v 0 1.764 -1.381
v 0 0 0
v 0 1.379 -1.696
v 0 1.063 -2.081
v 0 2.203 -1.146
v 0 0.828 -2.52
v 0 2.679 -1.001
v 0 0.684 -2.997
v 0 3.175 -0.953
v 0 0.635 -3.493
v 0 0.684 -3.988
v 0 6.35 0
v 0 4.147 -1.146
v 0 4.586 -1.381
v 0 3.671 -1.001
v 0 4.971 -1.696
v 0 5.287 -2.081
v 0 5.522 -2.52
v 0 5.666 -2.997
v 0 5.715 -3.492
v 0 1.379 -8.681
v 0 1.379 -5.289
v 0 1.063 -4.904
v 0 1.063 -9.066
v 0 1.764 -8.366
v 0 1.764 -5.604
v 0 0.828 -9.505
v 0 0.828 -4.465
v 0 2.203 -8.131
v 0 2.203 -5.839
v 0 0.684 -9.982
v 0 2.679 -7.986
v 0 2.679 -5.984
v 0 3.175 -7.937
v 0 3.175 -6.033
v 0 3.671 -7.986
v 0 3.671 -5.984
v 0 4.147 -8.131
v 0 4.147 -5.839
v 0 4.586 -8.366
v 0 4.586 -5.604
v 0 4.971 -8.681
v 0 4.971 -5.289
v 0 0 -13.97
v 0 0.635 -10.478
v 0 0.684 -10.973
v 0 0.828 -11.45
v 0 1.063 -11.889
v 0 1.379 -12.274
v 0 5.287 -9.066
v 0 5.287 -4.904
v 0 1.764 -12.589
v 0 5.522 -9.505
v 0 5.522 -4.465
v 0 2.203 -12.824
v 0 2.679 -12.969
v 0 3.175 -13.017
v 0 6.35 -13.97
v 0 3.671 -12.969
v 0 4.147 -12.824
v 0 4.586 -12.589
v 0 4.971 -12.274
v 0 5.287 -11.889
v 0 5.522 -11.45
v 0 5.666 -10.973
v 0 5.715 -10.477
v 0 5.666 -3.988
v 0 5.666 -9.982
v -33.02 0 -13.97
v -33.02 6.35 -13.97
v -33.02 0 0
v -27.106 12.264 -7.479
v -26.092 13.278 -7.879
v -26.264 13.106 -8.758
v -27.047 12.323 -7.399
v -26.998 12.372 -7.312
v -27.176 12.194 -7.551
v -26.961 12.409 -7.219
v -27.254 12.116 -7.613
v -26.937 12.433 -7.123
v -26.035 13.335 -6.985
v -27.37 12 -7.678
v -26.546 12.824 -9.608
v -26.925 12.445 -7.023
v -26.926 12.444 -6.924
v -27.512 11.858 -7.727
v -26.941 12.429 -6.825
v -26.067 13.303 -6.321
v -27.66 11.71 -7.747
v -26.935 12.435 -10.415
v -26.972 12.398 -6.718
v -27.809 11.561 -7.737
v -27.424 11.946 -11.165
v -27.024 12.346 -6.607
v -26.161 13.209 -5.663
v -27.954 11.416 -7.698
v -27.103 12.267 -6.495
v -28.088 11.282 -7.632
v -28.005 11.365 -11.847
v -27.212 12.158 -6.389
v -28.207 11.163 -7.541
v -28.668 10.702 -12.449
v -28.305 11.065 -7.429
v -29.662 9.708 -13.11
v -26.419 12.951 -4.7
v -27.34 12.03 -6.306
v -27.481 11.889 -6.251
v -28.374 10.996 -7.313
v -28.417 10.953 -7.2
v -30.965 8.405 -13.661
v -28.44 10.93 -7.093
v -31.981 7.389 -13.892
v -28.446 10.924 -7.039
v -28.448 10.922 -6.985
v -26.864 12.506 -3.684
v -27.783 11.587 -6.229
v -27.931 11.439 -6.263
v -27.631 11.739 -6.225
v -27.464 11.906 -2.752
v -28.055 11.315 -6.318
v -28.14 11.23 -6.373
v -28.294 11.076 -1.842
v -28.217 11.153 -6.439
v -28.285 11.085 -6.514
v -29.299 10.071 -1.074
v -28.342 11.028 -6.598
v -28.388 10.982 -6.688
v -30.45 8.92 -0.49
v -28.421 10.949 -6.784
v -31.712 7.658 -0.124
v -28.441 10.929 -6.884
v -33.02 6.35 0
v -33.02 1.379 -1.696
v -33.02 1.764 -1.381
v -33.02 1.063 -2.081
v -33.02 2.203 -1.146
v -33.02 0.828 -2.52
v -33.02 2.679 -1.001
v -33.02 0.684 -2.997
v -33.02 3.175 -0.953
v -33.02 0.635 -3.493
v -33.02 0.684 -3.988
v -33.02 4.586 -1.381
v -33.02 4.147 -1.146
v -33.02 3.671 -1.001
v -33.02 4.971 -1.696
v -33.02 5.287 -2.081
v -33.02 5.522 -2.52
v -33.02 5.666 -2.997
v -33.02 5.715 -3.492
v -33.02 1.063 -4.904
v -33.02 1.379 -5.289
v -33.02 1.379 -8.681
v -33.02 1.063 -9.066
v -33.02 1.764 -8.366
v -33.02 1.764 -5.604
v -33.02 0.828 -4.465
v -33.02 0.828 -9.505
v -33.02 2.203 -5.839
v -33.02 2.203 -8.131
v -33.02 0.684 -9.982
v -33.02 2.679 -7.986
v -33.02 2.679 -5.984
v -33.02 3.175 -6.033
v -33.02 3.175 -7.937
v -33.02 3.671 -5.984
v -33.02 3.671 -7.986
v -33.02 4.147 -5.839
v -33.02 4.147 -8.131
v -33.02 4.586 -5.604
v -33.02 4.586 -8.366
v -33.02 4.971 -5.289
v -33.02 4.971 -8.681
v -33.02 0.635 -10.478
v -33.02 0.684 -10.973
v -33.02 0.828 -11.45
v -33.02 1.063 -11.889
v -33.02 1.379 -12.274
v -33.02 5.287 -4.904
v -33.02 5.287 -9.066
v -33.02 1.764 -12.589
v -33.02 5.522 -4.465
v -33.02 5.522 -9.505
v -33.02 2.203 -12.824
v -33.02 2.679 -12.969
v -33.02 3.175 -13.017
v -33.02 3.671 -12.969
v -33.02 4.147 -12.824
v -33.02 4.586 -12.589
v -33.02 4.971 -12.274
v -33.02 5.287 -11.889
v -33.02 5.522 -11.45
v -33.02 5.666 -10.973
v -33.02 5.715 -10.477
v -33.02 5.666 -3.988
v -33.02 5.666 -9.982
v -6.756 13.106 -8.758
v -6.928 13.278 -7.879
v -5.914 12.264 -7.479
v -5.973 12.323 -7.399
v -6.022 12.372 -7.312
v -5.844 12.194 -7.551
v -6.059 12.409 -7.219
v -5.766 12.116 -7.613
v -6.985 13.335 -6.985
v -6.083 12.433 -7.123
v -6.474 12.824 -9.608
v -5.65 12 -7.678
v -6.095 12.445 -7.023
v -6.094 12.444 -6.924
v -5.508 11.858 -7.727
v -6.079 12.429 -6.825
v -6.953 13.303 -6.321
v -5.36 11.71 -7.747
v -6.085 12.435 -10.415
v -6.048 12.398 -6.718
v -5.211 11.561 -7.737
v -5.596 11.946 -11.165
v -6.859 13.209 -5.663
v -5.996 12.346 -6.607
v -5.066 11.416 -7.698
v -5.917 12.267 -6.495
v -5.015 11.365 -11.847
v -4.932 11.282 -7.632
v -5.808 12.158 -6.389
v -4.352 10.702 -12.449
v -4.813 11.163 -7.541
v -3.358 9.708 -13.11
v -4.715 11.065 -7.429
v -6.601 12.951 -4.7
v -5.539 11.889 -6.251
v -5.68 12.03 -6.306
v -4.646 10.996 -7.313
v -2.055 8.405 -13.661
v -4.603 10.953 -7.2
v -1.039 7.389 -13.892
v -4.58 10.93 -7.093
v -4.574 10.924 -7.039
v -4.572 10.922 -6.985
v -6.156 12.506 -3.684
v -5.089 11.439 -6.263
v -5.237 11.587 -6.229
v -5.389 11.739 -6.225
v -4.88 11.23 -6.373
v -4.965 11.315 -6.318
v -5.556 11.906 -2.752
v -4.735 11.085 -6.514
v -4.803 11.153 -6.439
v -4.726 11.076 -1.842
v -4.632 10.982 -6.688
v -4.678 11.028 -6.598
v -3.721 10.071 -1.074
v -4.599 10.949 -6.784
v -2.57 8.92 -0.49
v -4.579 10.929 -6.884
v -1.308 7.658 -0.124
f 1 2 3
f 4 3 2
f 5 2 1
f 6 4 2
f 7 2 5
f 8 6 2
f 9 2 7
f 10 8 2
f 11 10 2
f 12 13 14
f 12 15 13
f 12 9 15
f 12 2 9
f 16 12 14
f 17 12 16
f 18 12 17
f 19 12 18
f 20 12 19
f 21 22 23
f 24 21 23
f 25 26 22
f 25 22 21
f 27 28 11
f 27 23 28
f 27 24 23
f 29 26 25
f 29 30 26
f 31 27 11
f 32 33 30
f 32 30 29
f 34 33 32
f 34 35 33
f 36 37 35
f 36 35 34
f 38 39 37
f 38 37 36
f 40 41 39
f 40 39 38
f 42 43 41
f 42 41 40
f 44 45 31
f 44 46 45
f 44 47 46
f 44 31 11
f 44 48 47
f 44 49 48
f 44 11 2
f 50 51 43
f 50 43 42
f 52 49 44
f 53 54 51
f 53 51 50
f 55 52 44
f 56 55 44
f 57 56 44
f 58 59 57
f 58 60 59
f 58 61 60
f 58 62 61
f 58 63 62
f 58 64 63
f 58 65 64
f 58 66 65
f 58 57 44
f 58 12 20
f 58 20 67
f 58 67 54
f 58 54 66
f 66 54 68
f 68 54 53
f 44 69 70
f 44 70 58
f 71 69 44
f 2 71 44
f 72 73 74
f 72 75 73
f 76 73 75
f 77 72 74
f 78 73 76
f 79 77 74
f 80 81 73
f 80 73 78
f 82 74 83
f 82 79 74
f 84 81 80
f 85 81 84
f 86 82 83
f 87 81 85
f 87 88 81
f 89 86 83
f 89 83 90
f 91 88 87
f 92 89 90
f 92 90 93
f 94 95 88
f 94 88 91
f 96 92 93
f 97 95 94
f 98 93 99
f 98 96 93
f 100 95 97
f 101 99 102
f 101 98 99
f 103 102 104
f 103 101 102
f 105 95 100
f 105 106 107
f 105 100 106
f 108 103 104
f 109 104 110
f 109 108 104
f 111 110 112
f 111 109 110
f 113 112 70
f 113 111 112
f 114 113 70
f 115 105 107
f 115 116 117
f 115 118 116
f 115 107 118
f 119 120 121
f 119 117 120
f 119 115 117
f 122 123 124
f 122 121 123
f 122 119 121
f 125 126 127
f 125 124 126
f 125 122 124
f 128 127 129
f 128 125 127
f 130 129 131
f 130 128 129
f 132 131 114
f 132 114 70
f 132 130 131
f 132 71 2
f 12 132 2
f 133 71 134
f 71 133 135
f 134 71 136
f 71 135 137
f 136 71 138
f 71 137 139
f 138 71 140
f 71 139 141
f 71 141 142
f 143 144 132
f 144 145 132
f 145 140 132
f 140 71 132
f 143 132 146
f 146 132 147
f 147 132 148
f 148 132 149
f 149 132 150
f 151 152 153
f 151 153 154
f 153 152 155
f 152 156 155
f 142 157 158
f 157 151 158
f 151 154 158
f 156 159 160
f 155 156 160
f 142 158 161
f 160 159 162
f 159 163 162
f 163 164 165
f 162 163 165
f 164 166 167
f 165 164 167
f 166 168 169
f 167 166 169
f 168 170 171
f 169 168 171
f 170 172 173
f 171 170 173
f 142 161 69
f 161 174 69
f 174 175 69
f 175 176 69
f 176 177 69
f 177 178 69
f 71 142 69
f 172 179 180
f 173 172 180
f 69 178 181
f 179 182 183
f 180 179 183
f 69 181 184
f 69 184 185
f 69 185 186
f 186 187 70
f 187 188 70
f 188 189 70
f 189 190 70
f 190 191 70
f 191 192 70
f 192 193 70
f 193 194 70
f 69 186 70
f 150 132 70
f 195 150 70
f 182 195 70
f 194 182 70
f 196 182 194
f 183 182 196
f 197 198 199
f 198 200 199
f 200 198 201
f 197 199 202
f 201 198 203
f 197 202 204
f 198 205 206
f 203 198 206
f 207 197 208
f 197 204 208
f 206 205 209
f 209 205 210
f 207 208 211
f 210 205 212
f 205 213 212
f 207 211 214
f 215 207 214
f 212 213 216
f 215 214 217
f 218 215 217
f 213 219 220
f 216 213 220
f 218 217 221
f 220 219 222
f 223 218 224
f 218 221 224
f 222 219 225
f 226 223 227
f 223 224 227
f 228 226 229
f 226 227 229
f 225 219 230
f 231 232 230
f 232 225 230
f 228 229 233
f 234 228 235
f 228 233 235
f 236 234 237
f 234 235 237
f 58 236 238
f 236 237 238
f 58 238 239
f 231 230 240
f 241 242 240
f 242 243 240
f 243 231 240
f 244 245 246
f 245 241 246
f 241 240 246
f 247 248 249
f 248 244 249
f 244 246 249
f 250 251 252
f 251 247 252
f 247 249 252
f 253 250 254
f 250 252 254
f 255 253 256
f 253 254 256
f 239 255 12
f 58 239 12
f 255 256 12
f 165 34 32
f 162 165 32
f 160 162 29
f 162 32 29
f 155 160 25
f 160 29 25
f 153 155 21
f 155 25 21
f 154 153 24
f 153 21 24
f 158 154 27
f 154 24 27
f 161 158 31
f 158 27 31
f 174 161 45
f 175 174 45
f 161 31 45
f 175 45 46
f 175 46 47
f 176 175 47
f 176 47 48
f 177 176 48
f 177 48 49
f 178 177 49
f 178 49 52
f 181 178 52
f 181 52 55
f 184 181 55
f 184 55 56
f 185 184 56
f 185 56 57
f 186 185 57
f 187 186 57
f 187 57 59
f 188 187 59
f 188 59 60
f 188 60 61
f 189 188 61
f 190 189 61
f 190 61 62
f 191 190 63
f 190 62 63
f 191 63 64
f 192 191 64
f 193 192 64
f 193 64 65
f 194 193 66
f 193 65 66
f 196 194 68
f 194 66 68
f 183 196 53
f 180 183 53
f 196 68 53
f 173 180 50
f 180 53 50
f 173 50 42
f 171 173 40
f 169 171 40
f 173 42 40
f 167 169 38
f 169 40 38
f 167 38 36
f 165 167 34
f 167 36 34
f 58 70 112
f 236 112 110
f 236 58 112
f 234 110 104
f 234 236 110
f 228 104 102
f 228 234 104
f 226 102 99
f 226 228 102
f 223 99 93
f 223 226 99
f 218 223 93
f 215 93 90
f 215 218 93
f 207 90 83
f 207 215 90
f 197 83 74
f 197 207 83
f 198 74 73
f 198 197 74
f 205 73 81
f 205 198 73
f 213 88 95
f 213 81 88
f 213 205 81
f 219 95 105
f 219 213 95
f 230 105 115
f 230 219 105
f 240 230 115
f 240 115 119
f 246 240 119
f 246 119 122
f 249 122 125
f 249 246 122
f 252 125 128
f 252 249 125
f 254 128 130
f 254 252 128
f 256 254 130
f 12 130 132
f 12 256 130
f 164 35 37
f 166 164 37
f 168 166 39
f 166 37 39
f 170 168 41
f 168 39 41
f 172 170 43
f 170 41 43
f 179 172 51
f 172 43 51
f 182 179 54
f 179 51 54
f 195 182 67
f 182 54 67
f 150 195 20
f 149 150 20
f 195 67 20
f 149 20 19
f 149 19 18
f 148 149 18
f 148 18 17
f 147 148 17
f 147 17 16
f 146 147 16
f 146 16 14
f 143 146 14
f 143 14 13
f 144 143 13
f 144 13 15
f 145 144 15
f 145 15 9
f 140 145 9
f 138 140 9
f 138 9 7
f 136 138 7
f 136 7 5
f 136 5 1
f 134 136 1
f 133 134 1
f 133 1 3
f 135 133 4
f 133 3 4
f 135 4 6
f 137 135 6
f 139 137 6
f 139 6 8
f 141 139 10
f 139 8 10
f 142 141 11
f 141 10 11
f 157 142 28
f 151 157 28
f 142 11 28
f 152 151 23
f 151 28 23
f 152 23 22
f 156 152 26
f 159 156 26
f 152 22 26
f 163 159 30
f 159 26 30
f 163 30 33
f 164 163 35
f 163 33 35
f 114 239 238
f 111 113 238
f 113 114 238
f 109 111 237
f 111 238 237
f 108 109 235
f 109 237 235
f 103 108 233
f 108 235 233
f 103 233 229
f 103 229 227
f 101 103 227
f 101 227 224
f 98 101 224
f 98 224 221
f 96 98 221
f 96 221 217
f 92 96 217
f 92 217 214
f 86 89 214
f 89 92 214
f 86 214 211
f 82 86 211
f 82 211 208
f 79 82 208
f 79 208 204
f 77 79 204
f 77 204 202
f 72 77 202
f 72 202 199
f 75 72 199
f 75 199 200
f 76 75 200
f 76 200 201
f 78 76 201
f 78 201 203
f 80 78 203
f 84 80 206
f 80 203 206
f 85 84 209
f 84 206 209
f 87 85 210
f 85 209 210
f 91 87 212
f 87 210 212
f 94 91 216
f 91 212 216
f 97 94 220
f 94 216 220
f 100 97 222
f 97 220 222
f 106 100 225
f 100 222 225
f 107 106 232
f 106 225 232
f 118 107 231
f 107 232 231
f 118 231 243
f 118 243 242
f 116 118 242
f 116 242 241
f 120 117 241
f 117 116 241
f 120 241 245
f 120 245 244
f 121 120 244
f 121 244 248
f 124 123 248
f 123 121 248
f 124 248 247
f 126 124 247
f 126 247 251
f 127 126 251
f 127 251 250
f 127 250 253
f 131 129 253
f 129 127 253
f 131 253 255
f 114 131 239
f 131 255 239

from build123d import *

# Parameters (mm, degrees)
SKETCH1_W              = 33.02
SKETCH1_H              = 13.97
DEPTH_A_DEPTH          = 6.35
ROUND_EXTRUDE_DEPTH    = 33.02
ANGLE_CUT_DEPTH        = 39.253150524
STRING_HOLE_R          = 0.762
STRING_HOLE_CUT_DEPTH  = 39.253150524
ELASTIC_HOLES_R        = 2.54
ELASTIC_HOLE_CUT_DEPTH = 39.253150524


with BuildPart() as part:
    # Sketch1 → depth a (new body)
    with BuildSketch(Plane(origin=(0, 0, 0), x_dir=(1, 0, 0), z_dir=(0, 1, 0))):
        with Locations((-16.51, 6.985)):
            Rectangle(SKETCH1_W, SKETCH1_H)
    extrude(amount=DEPTH_A_DEPTH)

    # Sketch4 → round extrude (add)
    with BuildSketch(Plane(origin=(0, 0, 0), x_dir=(0, 0, -1), z_dir=(1, 0, 0))):
        with BuildLine():
            Line((0, 6.35), (13.97, 6.35))
            ThreePointArc((13.97, 6.35), (6.985, 13.335), (0, 6.35))
        make_face()
    extrude(amount=-ROUND_EXTRUDE_DEPTH)

    # Sketch5 → angle cut (cut, through all)
    with BuildSketch(Plane.XY):
        Polygon((0, 6.35), (0, 13.335), (-6.985, 13.335), align=None)
        Polygon((-33.02, 6.35), (-33.02, 13.335), (-26.035, 13.335), align=None)
    extrude(amount=-ANGLE_CUT_DEPTH, mode=Mode.SUBTRACT)

    # string hole → string hole cut (cut, through all)
    with BuildSketch(Plane(origin=(0, 0, 0), x_dir=(0, 0, -1), z_dir=(1, 0, 0))):
        with Locations(Location((6.985, 11.684, 0), (0, 0, 270))):
            Circle(STRING_HOLE_R)
    extrude(amount=-STRING_HOLE_CUT_DEPTH, mode=Mode.SUBTRACT)

    # elastic holes → elastic hole cut (cut, through all)
    with BuildSketch(Plane(origin=(0, 0, 0), x_dir=(0, 0, -1), z_dir=(1, 0, 0))):
        with Locations((3.4925, 3.175)):
            Circle(ELASTIC_HOLES_R)
        with Locations(Location((10.4775, 3.175, 0), (0, 0, 180))):
            Circle(ELASTIC_HOLES_R)
    extrude(amount=-ELASTIC_HOLE_CUT_DEPTH, mode=Mode.SUBTRACT)


solid = part.part
